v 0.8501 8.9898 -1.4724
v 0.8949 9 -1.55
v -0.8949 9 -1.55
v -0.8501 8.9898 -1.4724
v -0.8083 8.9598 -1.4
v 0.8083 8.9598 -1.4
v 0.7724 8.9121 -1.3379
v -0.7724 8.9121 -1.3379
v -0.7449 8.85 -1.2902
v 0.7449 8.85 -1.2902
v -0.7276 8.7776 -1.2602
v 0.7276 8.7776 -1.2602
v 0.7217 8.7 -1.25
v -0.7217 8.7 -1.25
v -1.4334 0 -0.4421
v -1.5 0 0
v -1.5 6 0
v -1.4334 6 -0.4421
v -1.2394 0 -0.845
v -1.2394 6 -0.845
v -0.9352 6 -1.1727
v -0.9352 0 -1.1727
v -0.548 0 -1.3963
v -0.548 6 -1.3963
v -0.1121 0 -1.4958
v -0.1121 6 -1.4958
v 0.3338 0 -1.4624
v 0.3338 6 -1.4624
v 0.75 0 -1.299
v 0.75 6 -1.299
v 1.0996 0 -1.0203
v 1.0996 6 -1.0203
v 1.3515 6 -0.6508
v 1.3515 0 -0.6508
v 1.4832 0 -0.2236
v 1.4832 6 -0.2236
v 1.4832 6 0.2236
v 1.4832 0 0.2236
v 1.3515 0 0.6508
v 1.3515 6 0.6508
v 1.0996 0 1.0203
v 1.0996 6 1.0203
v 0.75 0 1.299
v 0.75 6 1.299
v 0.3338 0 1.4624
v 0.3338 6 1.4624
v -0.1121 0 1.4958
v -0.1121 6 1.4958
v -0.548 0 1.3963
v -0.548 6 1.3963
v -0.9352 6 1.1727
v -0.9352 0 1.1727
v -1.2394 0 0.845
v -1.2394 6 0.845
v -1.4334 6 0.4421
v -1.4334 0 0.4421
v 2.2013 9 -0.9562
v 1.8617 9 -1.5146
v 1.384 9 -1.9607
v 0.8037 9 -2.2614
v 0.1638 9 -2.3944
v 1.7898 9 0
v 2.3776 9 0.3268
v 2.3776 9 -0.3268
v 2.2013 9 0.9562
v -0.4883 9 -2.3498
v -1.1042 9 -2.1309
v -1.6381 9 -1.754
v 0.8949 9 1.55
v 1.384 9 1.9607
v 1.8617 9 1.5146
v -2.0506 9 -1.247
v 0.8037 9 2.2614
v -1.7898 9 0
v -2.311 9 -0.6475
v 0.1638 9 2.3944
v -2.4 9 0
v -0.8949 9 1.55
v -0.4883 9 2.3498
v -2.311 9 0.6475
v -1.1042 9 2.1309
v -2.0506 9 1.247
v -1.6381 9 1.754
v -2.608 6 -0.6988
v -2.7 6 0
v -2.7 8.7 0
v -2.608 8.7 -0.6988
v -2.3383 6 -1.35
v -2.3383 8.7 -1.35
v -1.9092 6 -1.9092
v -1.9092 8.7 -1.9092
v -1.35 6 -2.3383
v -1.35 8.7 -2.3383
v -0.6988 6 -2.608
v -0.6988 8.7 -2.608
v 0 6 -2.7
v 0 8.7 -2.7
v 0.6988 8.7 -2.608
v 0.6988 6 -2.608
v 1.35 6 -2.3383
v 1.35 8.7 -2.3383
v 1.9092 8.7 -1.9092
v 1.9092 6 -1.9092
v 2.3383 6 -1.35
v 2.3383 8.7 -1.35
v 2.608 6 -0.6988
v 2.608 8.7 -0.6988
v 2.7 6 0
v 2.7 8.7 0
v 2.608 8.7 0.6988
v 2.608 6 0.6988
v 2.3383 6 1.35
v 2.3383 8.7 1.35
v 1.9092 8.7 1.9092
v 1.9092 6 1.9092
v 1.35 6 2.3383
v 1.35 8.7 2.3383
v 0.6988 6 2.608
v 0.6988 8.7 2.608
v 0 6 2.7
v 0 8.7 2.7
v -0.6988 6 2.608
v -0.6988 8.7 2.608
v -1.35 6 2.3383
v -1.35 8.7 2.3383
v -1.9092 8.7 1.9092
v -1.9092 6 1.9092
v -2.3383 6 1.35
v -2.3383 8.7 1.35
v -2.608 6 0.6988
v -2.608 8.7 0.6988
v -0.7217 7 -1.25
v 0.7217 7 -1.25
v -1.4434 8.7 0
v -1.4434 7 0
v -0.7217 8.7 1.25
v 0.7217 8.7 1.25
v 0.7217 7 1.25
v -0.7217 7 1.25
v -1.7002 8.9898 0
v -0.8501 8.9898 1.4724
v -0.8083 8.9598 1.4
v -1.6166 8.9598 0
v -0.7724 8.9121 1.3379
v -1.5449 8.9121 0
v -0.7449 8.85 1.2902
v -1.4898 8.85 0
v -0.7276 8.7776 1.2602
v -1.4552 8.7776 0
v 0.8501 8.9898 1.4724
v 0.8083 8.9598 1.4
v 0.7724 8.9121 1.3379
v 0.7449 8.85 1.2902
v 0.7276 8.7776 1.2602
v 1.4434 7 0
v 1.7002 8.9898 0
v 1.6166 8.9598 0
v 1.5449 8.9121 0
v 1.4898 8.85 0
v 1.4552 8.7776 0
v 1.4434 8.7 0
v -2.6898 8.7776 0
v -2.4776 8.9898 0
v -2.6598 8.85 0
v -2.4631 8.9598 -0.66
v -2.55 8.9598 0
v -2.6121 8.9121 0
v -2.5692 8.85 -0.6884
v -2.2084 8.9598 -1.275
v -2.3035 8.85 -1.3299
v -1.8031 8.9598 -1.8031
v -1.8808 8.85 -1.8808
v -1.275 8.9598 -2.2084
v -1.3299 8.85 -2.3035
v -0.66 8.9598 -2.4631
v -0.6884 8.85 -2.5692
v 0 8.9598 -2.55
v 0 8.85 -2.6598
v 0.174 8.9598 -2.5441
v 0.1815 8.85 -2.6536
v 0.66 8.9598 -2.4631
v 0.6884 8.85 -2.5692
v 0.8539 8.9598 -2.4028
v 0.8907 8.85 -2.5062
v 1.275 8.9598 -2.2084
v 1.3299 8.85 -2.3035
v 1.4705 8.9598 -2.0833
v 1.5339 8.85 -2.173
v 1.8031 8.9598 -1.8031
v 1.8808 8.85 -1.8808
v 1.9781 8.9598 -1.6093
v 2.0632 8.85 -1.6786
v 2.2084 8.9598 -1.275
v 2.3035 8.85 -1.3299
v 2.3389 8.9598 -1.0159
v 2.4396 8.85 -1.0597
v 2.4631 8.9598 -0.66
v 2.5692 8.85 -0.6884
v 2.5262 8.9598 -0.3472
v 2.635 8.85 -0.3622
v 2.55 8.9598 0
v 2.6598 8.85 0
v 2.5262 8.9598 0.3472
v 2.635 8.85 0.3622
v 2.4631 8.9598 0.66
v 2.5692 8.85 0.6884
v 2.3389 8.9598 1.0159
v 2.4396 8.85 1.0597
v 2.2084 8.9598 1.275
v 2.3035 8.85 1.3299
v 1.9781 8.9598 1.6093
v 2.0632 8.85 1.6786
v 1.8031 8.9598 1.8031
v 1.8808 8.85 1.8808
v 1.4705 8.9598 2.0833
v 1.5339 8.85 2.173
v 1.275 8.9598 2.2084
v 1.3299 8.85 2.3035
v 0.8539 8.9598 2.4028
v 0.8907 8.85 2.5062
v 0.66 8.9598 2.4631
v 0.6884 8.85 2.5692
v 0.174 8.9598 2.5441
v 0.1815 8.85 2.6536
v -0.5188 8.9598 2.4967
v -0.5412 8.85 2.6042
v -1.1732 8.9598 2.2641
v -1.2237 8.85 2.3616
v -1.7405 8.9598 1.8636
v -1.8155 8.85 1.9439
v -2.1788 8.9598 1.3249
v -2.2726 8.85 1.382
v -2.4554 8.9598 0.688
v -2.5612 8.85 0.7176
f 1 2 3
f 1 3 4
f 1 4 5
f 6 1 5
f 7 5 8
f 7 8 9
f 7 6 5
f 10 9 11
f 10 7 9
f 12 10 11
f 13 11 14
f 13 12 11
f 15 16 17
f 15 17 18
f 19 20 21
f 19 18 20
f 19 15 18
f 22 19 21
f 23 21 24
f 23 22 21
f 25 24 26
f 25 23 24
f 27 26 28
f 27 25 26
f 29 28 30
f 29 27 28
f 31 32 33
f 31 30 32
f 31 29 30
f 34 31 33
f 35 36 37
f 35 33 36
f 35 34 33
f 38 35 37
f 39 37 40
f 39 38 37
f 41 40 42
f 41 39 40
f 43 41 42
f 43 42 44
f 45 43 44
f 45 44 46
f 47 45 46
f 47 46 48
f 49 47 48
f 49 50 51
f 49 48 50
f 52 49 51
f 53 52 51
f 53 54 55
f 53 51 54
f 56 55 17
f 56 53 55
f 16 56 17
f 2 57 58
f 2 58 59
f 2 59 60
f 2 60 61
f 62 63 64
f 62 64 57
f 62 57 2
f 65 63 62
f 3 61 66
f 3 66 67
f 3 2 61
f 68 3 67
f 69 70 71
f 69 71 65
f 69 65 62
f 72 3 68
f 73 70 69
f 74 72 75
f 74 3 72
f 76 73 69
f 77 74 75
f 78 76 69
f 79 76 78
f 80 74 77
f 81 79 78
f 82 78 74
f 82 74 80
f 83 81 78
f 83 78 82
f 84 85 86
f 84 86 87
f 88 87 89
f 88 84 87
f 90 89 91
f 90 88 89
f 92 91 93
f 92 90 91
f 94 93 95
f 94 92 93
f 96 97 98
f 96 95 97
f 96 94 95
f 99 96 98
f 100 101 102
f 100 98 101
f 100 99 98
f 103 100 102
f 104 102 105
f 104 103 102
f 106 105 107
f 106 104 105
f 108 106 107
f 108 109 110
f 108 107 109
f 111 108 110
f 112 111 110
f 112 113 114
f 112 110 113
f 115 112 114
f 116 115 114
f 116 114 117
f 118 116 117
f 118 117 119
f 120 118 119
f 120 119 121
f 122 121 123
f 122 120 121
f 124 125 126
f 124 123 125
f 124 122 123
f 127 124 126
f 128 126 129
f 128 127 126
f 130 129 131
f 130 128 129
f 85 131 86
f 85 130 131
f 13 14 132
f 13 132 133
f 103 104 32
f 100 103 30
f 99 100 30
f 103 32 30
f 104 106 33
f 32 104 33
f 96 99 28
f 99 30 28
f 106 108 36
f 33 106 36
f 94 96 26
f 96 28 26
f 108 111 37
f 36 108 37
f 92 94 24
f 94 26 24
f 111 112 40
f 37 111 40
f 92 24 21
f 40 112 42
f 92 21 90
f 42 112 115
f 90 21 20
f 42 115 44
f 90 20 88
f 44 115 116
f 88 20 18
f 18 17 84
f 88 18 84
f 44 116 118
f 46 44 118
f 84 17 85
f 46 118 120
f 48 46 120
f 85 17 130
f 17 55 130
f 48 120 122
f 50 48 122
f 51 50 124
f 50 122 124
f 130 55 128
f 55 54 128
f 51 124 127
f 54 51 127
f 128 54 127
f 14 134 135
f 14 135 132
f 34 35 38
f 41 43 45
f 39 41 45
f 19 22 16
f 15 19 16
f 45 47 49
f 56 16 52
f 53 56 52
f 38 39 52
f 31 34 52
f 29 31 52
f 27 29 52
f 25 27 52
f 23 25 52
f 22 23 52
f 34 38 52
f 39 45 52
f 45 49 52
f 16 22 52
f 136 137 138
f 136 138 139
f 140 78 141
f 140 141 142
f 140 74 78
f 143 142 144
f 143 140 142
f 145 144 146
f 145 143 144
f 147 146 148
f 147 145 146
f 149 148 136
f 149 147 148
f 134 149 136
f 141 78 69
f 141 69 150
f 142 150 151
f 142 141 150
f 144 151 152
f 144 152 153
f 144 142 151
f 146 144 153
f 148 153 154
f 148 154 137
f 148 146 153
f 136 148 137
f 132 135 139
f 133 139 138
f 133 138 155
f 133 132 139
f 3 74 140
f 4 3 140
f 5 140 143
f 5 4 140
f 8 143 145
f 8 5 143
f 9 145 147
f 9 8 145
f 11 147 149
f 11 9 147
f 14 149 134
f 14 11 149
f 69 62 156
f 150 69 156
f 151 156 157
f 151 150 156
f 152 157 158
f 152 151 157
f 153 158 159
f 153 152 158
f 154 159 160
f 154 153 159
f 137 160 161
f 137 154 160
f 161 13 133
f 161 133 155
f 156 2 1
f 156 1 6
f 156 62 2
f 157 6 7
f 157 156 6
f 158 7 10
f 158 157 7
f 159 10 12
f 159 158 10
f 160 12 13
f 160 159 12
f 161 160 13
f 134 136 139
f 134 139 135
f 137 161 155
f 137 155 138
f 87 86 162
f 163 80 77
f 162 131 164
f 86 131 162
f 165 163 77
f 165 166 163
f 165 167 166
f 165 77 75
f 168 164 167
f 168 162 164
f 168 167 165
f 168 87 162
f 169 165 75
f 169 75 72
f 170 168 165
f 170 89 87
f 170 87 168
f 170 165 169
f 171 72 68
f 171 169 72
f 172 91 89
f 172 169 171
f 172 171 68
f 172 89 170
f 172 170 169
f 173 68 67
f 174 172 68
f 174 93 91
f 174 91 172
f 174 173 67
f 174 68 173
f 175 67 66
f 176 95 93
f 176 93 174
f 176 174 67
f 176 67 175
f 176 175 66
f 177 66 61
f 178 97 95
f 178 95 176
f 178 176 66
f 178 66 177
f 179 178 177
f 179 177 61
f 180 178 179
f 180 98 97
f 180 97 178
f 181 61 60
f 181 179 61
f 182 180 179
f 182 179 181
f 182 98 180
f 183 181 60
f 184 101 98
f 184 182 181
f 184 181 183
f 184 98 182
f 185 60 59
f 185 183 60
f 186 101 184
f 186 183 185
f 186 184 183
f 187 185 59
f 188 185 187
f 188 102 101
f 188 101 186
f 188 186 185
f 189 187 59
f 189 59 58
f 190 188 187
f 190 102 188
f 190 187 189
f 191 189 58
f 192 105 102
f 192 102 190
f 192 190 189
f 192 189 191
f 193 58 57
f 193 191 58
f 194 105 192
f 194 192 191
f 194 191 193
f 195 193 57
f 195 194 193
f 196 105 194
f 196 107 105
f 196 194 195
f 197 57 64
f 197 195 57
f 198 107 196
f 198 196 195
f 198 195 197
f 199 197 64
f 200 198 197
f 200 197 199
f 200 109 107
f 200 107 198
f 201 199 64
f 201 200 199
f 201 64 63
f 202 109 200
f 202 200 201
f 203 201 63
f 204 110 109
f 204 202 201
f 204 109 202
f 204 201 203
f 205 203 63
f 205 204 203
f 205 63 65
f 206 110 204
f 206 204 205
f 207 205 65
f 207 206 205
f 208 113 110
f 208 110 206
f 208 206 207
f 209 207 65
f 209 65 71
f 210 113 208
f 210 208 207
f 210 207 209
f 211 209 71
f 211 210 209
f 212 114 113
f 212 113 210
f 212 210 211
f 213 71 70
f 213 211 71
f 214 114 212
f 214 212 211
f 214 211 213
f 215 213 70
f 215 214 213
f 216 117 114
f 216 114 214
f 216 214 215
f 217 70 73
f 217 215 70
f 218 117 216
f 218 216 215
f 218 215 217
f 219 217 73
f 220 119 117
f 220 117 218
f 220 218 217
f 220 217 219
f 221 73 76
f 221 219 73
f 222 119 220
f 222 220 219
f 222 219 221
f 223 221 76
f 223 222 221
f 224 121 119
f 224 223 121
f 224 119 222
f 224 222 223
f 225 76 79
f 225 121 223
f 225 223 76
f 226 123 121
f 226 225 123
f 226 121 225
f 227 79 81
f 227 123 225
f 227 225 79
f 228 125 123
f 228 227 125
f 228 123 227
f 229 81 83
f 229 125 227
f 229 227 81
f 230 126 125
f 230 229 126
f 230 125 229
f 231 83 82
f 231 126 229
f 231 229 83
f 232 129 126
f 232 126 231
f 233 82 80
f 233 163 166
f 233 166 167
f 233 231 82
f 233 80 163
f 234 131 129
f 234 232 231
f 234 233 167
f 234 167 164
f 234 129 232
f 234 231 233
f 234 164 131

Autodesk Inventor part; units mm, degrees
ref_plane "YZ Plane" through (0, 0, 0) normal (1, 0, 0) x (0, 1, 0)
ref_plane "XZ Plane" through (0, 0, 0) normal (0, 1, 0) x (-1, 0, 0)
ref_plane "XY Plane" through (0, 0, 0) normal (0, 0, 1) x (1, 0, 0)
sketch "Sketch1" plane through (0, 0, 0) normal (0, 0, 1) x (1, 0, 0)
  line L0 (0, 0) -> (0, 9)
  line L1 (0, 9) -> (-2.7, 9)
  line L2 (-2.7, 9) -> (-2.7, 6)
  line L3 (-2.7, 6) -> (-1.5, 6)
  line L4 (-1.5, 6) -> (-1.5, 0)
  line L5 (-1.5, 0) -> (0, 0)
  dimension "d0" = 6
  dimension "d1" = 3
  dimension "d2" = 1.5
  dimension "d3" = 2.7
revolve "Revolution1" add sketch "Sketch1" angle 360 about axis through (0, 0, 0) along (0, 1, 0)
sketch "Sketch2" plane through (0, 9, 0) normal (0, 1, 0) x (1, 0, 0)
  line L0 (-0.7217, -1.25) -> (-1.4434, 0)
  line L1 (-1.4434, 0) -> (-0.7217, 1.25)
  line L2 (-0.7217, 1.25) -> (0.7217, 1.25)
  line L3 (0.7217, 1.25) -> (1.4434, 0)
  line L4 (1.4434, 0) -> (0.7217, -1.25)
  line L5 (0.7217, -1.25) -> (-0.7217, -1.25)
  point P0 (0, 0)
  point P1 (0, 0)
  dimension "d5" = 2.5
extrude "Extrusion1" cut sketch "Sketch2" against normal blind 2
fillet "Fillet1" radius 0.3 6 edges at (0, 9, -1.25) (1.0825, 9, -0.625) (1.0825, 9, 0.625) (0, 9, 1.25) (-1.0825, 9, 0.625) (-1.0825, 9, -0.625)
fillet "Fillet2" radius 0.3 1 edges at (2.7, 9, 0)
thread "Thread1" size "M3x0.5" class "6g" standard "ANSI Metric M Profile" length 11.5
properties part number "Screw_M3X6_SS_HEX" material "Stainless Steel"
